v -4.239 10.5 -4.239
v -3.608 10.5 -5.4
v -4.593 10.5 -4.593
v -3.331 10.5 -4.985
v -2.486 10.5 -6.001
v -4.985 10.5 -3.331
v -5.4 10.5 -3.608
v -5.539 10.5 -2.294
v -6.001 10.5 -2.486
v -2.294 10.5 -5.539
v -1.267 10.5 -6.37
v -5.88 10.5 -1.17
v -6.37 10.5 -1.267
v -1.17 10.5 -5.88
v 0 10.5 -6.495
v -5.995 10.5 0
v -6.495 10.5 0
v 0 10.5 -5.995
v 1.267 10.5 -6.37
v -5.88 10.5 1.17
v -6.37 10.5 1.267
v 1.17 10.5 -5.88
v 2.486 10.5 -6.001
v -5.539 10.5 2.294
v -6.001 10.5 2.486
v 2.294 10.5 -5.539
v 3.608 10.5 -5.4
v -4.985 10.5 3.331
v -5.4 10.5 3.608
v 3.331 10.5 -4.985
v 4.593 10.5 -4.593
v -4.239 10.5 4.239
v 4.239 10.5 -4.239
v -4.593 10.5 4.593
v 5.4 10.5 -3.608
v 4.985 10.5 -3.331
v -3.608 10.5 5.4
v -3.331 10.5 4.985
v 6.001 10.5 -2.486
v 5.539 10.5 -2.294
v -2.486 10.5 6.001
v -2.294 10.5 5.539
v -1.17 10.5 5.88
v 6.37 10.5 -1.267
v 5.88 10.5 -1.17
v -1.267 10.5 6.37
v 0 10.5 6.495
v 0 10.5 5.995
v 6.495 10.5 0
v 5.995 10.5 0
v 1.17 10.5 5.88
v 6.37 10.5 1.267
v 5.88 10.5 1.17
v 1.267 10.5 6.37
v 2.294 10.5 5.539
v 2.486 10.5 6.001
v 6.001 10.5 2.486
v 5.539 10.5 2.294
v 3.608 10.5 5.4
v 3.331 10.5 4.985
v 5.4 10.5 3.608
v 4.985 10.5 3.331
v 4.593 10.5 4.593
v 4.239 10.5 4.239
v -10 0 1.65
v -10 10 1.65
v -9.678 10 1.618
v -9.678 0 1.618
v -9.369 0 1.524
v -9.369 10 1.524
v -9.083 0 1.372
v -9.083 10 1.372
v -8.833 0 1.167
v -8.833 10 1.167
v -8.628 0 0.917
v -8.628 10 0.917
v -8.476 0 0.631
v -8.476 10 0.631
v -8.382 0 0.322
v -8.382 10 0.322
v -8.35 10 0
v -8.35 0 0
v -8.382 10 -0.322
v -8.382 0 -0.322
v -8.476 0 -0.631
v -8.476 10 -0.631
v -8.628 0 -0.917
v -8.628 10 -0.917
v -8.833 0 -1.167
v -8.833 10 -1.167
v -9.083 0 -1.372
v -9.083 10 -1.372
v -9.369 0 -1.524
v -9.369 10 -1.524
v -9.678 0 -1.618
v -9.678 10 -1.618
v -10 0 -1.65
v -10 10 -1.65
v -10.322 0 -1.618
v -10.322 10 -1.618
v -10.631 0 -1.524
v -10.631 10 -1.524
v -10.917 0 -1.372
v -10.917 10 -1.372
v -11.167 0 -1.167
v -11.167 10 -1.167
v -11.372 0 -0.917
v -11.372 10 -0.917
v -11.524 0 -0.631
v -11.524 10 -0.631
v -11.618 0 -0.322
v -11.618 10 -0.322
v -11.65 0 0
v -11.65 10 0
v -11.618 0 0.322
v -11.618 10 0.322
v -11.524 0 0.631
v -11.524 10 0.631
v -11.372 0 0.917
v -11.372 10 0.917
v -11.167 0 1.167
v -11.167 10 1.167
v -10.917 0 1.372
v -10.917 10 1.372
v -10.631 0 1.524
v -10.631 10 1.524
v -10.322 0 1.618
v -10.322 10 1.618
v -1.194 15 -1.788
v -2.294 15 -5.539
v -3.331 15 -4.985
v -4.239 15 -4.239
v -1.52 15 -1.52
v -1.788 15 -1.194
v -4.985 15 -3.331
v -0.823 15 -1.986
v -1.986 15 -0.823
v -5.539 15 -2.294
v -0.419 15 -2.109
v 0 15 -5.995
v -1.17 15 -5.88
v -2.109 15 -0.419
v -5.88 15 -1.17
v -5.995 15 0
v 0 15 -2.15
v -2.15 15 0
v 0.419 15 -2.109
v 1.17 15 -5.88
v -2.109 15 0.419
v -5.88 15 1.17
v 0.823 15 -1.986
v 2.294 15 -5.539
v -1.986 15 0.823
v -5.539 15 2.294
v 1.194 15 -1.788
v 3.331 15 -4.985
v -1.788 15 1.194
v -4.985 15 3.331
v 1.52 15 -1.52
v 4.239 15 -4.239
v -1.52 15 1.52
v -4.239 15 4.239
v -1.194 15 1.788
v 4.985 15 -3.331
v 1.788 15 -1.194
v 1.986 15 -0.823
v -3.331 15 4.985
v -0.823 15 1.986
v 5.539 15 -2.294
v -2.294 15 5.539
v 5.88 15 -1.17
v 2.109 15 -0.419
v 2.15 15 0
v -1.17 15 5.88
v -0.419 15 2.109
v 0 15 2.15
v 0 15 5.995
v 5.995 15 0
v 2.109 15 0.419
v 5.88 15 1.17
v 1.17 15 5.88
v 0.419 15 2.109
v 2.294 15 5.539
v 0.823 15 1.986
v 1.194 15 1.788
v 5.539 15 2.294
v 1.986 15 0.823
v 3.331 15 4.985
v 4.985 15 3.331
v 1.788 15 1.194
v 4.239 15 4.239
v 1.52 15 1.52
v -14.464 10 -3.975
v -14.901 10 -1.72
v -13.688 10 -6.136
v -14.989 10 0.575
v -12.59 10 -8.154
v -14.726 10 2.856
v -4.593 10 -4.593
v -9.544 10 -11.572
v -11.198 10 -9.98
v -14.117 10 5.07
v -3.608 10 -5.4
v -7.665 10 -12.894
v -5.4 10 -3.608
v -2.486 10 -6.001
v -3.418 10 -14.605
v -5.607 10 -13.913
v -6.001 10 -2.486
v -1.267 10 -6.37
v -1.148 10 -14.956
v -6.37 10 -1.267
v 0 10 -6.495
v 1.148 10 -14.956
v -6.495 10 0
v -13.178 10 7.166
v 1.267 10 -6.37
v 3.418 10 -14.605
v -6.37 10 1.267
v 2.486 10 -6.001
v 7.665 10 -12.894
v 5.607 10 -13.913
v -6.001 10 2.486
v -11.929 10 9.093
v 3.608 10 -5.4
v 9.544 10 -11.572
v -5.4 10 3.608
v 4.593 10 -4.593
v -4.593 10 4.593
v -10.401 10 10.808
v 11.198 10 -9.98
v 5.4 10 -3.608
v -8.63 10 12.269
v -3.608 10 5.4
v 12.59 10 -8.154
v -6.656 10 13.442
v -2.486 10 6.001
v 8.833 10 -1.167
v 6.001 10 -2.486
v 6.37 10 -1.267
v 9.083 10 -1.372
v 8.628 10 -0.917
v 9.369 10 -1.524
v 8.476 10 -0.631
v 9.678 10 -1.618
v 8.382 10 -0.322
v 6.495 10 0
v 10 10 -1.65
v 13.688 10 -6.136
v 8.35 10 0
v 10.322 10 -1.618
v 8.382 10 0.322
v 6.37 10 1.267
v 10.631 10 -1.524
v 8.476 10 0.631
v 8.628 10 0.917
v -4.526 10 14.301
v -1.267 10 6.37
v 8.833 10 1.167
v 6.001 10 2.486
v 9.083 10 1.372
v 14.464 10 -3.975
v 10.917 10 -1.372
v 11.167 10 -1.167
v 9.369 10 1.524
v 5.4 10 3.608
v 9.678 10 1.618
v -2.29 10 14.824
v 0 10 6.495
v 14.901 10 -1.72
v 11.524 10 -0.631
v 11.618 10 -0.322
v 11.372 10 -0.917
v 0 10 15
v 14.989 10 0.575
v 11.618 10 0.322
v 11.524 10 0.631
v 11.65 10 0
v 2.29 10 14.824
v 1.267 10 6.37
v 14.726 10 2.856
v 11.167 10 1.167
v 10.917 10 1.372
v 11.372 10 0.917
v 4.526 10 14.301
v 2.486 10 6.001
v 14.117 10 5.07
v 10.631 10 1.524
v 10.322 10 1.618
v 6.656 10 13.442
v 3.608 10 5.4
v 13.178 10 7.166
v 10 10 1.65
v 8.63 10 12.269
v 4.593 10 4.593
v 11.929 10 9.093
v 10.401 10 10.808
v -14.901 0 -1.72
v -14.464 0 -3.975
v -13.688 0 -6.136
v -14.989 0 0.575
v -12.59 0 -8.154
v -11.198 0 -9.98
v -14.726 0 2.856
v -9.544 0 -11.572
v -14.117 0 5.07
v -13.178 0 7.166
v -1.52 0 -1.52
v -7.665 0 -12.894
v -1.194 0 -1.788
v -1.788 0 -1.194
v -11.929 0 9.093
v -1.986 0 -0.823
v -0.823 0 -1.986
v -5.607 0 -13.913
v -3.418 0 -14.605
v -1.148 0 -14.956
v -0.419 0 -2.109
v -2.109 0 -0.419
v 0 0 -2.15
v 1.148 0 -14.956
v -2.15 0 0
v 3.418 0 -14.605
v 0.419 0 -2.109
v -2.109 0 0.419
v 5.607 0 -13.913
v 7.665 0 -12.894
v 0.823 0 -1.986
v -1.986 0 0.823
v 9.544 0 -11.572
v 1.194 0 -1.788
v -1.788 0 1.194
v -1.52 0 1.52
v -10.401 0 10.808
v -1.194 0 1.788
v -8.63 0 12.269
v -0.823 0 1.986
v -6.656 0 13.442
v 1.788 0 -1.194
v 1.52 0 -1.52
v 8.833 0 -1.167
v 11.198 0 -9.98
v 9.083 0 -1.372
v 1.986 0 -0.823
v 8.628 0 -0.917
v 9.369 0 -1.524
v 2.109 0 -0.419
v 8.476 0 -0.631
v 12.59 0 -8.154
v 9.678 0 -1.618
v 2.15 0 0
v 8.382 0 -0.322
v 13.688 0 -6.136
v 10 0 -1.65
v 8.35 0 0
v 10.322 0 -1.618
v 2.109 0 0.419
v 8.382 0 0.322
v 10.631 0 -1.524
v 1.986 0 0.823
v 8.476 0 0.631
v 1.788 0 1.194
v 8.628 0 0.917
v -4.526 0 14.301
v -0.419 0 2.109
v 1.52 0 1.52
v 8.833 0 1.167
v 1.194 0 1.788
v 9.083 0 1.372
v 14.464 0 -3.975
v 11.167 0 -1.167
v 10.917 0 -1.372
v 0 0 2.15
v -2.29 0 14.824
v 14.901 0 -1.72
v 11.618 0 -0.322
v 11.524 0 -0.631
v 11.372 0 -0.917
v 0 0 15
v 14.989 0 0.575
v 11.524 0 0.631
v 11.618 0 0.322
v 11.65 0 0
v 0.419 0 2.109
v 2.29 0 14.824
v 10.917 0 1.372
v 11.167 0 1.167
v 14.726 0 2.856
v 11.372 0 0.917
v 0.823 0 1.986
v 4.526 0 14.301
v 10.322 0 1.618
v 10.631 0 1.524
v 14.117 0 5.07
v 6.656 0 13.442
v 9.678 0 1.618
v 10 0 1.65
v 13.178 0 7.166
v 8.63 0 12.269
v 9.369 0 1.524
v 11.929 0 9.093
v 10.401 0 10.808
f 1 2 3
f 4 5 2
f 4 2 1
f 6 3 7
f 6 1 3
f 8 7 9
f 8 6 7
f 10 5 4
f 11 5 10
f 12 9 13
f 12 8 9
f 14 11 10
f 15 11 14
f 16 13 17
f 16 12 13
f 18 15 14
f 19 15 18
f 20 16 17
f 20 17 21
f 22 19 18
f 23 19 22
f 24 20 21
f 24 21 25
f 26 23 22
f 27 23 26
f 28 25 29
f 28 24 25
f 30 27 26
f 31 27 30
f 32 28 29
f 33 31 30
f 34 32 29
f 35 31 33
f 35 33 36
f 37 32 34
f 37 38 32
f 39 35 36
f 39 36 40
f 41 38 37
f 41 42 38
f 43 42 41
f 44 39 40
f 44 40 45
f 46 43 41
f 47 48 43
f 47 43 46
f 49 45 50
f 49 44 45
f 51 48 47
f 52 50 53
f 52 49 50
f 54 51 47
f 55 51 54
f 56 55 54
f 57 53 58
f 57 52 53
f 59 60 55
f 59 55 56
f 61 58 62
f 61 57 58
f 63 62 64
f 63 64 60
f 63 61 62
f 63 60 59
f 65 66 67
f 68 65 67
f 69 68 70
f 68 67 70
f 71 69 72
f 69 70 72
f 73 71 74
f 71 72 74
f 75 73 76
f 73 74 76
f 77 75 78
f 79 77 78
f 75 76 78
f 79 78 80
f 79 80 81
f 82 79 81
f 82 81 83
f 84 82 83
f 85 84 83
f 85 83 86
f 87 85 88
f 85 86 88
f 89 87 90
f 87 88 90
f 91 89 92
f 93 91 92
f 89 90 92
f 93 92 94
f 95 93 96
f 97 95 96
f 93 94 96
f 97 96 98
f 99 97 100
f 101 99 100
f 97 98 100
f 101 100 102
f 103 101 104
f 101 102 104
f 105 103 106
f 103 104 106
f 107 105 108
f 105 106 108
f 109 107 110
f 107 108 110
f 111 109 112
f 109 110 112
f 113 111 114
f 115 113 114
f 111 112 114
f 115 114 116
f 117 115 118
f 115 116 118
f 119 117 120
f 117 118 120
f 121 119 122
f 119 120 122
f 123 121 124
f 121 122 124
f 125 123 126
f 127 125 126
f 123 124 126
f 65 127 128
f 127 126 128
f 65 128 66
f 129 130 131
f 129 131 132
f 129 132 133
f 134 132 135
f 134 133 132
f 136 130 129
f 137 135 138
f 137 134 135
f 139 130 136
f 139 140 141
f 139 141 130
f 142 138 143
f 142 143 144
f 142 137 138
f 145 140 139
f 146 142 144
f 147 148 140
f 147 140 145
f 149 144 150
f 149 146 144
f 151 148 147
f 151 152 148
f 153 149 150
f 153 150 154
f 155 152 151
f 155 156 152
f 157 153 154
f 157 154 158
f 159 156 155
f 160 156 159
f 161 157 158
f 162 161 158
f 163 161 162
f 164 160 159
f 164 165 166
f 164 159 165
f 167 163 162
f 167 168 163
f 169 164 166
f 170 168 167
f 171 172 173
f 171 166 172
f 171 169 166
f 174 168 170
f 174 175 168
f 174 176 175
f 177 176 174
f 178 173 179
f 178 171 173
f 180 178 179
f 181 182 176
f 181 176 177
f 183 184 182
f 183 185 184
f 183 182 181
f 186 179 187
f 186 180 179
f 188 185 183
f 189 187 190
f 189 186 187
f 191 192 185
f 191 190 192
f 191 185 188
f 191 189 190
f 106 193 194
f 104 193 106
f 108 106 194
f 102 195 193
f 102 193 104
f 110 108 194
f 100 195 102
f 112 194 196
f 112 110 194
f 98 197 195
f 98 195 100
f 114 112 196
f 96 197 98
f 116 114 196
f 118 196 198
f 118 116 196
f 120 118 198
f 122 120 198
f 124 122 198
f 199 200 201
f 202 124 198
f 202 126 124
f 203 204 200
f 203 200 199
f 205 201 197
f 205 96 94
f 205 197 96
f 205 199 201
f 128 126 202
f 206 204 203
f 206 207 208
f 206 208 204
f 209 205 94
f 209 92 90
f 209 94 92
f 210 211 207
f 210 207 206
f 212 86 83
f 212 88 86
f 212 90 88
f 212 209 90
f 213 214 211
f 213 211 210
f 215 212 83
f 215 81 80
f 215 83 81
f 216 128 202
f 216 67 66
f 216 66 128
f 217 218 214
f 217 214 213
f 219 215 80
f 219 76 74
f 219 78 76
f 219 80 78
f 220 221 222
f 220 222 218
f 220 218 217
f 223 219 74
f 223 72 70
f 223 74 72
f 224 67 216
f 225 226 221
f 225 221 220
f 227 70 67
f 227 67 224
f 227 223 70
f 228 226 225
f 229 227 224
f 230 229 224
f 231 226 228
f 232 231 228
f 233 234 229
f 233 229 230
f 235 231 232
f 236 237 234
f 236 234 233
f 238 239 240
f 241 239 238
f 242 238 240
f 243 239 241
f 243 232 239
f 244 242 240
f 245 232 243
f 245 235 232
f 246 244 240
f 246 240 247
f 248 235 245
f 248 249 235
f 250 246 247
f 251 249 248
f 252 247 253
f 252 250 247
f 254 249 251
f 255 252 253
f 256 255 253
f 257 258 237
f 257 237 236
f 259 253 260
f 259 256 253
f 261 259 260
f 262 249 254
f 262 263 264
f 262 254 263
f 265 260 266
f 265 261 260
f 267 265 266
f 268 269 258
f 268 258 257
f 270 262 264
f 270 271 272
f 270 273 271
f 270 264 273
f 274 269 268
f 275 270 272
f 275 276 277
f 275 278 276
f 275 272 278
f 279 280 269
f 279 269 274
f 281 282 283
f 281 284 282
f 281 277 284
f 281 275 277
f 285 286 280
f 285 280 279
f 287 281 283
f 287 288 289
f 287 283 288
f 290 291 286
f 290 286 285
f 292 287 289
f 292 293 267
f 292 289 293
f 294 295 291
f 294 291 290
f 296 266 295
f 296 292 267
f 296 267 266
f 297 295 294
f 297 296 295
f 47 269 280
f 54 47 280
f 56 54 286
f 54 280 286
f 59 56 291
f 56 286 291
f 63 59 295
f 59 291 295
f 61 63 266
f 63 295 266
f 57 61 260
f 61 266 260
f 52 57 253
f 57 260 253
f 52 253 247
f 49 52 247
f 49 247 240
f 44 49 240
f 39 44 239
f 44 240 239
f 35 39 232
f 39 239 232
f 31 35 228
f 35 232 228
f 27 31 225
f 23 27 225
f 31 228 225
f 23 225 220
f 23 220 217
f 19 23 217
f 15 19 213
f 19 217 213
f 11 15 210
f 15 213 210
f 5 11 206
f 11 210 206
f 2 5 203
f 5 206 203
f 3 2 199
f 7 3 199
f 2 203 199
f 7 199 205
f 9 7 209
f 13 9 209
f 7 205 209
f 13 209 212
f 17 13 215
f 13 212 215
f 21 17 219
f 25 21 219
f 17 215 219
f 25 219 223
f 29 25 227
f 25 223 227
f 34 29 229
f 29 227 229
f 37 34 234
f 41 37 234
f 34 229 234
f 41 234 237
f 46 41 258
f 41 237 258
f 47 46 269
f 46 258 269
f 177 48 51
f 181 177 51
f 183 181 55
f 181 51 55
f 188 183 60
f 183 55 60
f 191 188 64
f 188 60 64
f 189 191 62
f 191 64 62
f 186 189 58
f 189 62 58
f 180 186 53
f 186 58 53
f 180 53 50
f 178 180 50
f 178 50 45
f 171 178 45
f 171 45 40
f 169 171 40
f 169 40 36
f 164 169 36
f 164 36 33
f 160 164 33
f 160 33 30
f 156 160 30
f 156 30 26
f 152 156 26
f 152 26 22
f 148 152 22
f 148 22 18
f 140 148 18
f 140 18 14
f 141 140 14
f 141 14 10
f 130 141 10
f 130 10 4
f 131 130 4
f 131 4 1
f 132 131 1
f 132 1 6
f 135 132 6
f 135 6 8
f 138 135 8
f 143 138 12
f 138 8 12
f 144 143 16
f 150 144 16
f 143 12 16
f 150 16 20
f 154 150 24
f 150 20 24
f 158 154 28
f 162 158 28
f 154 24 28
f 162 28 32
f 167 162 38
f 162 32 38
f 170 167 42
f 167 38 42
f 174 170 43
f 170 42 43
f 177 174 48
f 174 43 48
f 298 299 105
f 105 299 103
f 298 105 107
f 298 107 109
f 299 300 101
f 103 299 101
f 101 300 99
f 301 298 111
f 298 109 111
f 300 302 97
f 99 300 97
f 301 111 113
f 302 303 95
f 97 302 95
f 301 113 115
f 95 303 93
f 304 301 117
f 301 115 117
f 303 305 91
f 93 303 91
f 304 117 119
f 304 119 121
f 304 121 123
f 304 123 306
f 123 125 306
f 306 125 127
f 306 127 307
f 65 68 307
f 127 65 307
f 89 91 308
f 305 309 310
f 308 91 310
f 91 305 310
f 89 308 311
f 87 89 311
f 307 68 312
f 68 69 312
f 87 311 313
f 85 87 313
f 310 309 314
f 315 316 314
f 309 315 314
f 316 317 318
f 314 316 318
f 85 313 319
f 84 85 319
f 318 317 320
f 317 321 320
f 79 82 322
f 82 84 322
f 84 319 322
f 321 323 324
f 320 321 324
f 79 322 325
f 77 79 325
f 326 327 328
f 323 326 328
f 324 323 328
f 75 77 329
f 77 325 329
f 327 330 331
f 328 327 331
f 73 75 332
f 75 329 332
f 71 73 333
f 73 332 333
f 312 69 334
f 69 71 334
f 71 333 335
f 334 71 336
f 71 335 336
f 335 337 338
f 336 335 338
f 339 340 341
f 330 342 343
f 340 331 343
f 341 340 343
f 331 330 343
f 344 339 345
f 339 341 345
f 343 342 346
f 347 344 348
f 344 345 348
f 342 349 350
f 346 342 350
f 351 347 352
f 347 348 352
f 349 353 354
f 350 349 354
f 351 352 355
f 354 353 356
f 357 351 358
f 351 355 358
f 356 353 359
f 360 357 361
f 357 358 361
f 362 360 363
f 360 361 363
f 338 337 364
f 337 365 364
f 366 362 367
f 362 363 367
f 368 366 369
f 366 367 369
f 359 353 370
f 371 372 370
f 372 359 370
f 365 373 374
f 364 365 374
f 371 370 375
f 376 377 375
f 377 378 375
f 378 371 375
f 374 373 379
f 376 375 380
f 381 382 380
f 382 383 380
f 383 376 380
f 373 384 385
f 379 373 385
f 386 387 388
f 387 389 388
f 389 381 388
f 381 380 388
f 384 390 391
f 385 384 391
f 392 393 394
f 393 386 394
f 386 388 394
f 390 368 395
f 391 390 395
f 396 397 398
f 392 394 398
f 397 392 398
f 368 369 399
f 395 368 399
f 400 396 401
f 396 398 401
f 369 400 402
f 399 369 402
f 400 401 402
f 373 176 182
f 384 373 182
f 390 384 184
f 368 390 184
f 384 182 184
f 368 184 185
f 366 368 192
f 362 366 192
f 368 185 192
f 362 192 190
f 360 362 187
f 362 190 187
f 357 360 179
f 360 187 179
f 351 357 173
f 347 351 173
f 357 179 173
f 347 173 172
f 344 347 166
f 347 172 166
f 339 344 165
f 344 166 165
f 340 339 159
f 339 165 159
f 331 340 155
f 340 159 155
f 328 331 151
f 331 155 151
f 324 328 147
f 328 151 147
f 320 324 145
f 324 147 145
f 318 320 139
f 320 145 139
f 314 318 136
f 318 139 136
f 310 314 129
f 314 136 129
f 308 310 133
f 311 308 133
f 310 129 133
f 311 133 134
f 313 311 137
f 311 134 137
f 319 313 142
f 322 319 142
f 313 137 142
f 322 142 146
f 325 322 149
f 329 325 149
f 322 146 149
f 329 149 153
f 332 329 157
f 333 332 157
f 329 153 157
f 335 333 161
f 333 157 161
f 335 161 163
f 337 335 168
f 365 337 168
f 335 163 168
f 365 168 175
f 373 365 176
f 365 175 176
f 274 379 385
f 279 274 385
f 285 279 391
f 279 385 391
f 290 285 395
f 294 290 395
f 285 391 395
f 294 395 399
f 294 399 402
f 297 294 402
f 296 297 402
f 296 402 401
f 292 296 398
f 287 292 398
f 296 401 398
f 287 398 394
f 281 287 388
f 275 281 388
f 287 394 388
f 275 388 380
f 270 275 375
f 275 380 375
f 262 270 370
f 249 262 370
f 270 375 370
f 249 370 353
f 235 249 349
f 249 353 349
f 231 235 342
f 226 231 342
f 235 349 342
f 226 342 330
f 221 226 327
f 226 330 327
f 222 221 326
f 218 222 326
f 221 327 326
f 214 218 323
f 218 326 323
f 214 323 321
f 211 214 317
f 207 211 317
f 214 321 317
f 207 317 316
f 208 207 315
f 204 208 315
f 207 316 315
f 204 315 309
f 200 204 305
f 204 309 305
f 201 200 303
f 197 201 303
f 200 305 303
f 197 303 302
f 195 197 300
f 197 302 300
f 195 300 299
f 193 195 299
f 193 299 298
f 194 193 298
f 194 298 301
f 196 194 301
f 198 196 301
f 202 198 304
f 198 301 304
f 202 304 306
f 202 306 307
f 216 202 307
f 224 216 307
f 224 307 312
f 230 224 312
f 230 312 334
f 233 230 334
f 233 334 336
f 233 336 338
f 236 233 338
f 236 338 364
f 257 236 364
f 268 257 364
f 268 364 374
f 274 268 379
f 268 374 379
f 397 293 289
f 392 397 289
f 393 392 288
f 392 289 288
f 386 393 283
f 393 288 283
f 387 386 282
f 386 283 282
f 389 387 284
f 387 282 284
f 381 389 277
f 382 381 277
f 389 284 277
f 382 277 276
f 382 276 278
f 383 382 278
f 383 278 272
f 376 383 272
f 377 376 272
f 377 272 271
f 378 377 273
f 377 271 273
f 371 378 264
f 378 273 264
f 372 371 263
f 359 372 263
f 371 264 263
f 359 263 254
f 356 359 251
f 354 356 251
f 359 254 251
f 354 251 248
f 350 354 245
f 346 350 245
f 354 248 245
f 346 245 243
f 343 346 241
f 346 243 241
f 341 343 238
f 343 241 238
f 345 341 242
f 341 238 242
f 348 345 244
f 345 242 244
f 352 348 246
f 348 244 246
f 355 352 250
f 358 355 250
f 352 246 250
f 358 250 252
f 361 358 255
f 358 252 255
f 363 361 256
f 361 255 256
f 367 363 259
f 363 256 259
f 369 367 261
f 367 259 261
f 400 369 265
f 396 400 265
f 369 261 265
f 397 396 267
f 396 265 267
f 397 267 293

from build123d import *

# Parameters (mm, degrees)
SKETCH_1_R          = 15
EXTRUDE_1_DEPTH     = 10
SKETCH_2_R          = 5.995
EXTRUDE_2_DEPTH     = 5
SKETCH_3_R          = 6.495
EXTRUDE_3_DEPTH     = 0.5
SKETCH_4_R          = 1.65
CUT_EXTRUDE_1_DEPTH = 10
SKETCH_5_R          = 2.15
CUT_EXTRUDE_2_DEPTH = 15


with BuildPart() as part:
    # ｽｹｯﾁ1 → ﾎﾞｽ - 押し出し1 (new body)
    with BuildSketch(Plane(origin=(0, 0, 0), x_dir=(1, 0, 0), z_dir=(0, 1, 0))):
        with Locations(Location((0, 0, 0), (0, 0, 270))):
            Circle(SKETCH_1_R)
    extrude(amount=EXTRUDE_1_DEPTH)

    # ｽｹｯﾁ2 → ﾎﾞｽ - 押し出し2 (add)
    with BuildSketch(Plane(origin=(0, 10, 0), x_dir=(1, 0, 0), z_dir=(0, 1, 0))):
        with Locations(Location((0, 0, 0), (0, 0, 270))):
            Circle(SKETCH_2_R)
    extrude(amount=EXTRUDE_2_DEPTH)

    # ｽｹｯﾁ3 → ﾎﾞｽ - 押し出し3 (add)
    with BuildSketch(Plane(origin=(0, 10, 0), x_dir=(1, 0, 0), z_dir=(0, 1, 0))):
        with Locations(Location((0, 0, 0), (0, 0, 270))):
            Circle(SKETCH_3_R)
    extrude(amount=EXTRUDE_3_DEPTH)

    # ｽｹｯﾁ4 → ｶｯﾄ - 押し出し1 (cut)
    with BuildSketch(Plane(origin=(0, 10, 0), x_dir=(1, 0, 0), z_dir=(0, 1, 0))):
        with Locations(Location((10, 0, 0), (0, 0, 270))):
            Circle(SKETCH_4_R)
        with Locations(Location((-10, 0, 0), (0, 0, 270))):
            Circle(SKETCH_4_R)
    extrude(amount=-CUT_EXTRUDE_1_DEPTH, mode=Mode.SUBTRACT)

    # ｽｹｯﾁ5 → ｶｯﾄ - 押し出し2 (cut)
    with BuildSketch(Plane(origin=(0, 15, 0), x_dir=(1, 0, 0), z_dir=(0, 1, 0))):
        with Locations(Location((0, 0, 0), (0, 0, 270))):
            Circle(SKETCH_5_R)
    extrude(amount=-CUT_EXTRUDE_2_DEPTH, mode=Mode.SUBTRACT)


solid = part.part
